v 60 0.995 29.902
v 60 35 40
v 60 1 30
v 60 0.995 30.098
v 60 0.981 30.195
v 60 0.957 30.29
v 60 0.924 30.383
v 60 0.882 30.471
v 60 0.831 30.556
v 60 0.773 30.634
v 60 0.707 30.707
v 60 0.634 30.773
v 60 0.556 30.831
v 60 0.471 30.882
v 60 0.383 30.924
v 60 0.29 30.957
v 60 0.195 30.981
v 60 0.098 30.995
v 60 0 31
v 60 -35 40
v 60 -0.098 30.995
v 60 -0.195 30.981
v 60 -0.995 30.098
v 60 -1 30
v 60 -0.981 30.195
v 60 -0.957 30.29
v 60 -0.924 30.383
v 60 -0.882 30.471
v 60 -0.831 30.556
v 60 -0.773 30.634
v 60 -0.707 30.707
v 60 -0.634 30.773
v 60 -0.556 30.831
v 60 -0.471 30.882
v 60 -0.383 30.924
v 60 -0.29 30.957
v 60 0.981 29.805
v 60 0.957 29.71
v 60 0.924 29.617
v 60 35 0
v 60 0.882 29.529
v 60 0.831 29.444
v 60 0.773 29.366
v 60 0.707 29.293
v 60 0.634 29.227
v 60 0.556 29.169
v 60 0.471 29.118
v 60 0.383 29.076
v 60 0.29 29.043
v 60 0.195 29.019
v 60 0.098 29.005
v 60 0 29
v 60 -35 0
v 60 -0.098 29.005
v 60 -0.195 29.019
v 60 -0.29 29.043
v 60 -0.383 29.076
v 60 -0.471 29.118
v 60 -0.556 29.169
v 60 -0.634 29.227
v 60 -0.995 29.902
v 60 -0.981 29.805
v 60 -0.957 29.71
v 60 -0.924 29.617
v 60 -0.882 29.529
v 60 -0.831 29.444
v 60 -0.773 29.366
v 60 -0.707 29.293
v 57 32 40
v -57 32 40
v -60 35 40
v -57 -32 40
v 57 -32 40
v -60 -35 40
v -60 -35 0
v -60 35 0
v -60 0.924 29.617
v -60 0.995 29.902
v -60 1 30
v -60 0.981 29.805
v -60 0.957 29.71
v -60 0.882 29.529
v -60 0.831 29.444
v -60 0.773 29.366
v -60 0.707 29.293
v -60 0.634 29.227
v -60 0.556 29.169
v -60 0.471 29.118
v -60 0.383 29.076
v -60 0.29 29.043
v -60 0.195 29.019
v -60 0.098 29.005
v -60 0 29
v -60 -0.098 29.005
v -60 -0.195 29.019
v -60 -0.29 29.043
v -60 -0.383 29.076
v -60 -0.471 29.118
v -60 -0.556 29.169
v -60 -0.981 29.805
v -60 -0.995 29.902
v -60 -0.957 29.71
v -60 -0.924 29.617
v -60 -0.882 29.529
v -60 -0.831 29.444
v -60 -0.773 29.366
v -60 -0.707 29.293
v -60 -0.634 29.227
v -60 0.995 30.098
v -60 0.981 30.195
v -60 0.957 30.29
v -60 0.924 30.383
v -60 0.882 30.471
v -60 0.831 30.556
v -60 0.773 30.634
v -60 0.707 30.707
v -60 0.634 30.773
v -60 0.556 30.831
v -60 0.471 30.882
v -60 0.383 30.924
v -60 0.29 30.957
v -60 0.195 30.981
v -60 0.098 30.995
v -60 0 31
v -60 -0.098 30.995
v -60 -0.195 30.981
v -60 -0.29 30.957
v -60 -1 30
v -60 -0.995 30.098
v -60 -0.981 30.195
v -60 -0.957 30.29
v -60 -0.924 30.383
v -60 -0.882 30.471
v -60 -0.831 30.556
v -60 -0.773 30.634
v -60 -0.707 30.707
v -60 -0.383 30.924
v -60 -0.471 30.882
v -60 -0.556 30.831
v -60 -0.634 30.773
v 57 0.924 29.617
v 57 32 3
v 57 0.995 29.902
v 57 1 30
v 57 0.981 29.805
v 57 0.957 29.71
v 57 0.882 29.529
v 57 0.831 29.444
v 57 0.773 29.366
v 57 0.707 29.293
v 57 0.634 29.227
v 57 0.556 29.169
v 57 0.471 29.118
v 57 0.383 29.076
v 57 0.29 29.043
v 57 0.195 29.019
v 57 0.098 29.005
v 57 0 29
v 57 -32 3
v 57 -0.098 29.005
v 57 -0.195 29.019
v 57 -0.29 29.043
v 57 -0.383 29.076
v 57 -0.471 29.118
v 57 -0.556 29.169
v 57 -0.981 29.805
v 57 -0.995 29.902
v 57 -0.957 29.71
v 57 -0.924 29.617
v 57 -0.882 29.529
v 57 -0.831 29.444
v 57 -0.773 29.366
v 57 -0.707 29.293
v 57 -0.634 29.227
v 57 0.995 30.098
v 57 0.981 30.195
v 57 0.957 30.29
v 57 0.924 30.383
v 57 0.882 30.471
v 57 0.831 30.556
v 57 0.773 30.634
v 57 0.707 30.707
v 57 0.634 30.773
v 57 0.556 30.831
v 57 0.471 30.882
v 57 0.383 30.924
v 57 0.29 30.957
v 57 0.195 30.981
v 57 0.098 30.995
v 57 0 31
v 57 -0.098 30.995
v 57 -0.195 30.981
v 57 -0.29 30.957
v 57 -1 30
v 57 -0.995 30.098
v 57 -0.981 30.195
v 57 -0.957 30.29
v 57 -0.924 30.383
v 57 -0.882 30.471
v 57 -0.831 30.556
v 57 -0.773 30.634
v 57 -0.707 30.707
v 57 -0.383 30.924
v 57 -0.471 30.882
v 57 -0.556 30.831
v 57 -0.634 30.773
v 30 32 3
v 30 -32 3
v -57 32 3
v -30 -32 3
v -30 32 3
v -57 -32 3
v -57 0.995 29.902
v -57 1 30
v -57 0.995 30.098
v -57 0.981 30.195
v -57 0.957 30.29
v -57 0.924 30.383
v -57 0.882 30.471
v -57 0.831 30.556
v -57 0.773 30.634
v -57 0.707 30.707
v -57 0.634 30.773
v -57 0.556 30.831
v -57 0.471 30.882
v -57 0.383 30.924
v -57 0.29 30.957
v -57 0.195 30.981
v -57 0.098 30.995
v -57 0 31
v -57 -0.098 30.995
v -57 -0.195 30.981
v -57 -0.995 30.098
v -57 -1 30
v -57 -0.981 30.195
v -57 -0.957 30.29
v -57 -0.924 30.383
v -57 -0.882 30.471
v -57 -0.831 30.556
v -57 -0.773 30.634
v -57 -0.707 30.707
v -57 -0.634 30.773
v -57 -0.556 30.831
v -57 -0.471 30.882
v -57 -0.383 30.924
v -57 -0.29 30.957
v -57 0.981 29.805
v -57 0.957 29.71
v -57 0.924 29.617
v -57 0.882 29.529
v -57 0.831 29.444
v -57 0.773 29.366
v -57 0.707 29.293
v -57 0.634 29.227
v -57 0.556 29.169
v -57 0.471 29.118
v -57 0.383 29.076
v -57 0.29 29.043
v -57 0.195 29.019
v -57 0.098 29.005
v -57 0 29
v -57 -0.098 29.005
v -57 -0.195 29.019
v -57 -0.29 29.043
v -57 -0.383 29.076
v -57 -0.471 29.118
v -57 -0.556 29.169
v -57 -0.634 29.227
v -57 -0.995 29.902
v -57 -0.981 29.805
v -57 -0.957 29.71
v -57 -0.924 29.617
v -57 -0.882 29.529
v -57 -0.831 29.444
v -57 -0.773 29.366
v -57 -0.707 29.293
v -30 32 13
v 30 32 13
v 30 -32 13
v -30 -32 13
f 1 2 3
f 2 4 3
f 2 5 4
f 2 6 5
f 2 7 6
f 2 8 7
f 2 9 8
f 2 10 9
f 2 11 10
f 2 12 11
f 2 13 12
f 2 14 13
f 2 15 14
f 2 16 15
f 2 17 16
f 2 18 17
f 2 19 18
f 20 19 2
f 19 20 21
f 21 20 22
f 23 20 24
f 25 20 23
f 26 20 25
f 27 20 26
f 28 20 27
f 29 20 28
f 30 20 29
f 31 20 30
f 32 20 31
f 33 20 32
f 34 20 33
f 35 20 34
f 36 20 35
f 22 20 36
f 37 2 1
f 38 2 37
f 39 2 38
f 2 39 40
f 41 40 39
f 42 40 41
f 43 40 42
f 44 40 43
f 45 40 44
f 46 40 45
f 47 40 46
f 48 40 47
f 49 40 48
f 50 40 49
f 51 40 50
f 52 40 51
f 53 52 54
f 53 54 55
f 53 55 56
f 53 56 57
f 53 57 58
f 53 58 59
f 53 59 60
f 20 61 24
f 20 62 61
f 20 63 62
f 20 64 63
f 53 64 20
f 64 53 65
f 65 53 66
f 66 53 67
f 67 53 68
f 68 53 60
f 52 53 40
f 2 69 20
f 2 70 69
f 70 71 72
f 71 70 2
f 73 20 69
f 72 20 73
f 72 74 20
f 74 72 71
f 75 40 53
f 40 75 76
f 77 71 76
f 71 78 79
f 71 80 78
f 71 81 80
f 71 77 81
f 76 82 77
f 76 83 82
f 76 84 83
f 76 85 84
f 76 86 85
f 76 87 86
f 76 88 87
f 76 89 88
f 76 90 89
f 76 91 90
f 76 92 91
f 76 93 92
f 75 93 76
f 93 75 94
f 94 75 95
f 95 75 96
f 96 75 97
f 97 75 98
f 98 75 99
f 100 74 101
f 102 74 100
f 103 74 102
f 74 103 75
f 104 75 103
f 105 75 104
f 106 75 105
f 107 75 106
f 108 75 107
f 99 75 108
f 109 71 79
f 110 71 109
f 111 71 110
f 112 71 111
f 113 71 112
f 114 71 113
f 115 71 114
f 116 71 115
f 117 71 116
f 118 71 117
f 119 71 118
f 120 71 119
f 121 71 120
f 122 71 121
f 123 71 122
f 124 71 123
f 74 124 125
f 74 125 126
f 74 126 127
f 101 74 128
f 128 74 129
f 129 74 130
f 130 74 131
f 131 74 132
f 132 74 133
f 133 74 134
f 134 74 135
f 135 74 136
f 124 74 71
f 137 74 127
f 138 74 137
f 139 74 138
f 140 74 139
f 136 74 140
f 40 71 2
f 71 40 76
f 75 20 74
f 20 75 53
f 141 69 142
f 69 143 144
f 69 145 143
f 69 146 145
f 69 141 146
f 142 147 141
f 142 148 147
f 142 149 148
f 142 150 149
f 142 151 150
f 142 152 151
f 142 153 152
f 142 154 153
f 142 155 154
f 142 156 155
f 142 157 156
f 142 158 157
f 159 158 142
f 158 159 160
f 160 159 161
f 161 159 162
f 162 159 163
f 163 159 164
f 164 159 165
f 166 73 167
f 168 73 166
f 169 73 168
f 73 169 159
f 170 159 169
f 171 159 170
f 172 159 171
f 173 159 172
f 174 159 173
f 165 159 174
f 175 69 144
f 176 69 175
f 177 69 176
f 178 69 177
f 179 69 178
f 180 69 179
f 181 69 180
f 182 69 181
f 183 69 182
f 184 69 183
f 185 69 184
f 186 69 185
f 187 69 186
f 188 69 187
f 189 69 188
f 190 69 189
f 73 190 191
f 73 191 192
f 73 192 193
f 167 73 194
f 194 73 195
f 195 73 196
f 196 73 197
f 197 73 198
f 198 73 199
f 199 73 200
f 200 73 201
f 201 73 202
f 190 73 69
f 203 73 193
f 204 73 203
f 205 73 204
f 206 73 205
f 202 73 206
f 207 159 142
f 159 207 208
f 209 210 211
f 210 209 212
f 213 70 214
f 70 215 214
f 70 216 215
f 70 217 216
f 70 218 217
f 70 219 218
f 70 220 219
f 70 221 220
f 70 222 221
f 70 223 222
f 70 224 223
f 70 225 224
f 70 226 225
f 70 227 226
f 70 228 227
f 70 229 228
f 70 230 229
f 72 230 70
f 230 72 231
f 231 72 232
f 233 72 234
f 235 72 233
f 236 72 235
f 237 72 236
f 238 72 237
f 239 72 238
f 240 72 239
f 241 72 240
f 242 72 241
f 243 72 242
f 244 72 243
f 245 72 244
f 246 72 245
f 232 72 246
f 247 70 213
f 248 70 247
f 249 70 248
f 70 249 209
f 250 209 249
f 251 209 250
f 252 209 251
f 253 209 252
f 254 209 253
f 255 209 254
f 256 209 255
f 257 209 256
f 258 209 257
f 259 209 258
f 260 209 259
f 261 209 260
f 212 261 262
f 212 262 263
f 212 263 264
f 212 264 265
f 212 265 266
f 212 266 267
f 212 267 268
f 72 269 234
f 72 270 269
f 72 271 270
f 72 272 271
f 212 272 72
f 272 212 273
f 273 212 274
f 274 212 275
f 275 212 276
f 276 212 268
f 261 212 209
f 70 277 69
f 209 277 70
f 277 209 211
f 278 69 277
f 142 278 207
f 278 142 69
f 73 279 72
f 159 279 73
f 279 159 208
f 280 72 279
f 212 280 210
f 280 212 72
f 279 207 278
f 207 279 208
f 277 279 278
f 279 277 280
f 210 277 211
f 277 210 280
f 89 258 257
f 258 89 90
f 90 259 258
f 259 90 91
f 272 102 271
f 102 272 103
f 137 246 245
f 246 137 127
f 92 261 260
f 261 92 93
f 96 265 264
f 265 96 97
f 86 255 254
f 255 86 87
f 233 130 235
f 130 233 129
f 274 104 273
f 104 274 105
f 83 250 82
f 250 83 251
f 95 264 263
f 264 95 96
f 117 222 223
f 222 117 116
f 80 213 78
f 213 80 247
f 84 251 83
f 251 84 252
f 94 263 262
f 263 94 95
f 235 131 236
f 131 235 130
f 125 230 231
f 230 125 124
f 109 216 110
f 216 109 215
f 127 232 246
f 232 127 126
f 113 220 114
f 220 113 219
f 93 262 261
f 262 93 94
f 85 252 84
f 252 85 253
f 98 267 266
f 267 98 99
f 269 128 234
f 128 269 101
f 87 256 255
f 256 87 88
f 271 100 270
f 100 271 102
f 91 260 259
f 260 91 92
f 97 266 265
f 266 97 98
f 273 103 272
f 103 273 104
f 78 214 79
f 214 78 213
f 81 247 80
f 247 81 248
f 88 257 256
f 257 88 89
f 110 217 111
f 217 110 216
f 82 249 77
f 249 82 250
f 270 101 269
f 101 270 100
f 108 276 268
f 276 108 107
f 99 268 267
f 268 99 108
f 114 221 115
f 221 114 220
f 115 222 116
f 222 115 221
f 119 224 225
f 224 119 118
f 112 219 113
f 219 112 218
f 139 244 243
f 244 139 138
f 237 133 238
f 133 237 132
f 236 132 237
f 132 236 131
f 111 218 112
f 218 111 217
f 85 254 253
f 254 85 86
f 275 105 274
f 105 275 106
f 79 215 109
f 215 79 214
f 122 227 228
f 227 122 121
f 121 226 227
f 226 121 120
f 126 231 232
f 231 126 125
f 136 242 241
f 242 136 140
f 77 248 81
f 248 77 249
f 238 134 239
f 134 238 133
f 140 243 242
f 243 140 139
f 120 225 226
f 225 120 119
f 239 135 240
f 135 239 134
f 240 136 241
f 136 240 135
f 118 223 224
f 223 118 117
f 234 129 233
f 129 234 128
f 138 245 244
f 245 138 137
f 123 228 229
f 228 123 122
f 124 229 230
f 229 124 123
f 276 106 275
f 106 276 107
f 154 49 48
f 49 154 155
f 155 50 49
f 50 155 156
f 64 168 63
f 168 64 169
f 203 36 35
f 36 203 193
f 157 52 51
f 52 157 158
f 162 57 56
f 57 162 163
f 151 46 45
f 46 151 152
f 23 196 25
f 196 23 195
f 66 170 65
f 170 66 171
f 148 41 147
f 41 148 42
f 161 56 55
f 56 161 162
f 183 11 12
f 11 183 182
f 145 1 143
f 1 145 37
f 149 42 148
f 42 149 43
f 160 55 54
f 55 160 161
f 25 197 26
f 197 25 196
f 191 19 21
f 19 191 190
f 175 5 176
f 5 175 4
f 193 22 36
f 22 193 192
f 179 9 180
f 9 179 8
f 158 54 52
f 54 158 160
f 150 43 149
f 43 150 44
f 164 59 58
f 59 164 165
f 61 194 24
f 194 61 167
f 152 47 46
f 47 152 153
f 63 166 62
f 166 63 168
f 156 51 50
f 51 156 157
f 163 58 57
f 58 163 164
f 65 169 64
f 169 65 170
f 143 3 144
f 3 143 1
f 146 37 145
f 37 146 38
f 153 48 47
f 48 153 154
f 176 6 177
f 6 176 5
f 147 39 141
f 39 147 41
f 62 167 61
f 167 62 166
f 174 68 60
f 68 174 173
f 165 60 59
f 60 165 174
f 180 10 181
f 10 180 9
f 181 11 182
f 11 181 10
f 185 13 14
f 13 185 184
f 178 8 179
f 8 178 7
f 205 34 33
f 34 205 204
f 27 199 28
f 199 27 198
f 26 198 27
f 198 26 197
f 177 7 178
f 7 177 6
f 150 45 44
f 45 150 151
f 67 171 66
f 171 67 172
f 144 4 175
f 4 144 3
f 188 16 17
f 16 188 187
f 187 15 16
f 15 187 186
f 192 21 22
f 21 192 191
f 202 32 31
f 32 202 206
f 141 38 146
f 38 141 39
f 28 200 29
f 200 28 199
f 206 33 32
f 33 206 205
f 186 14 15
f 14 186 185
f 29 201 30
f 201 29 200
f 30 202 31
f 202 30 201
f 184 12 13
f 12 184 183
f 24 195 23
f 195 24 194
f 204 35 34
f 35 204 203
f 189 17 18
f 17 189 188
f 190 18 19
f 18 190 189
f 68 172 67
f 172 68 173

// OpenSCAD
// Buffer tank for mini horizontal gel-electrophoresis box
$fn = 64;

tank_x = 120;        // outer length (X)
tank_y = 70;         // outer width (Y)
tank_z = 40;         // outer height (Z)
wall = 3;            // wall thickness
floor_t = 3;         // floor thickness
plat_len = 60;       // platform length in X (centred)
plat_h = 10;         // platform height above inner floor
hole_d = 2;          // electrode wire hole diameter
hole_y = 0;          // hole Y position
hole_z = 30;         // hole Z position
eps = 0.5;           // cutter overshoot

difference() {
    union() {
        // open-top tank shell
        difference() {
            translate([-tank_x/2, -tank_y/2, 0])
                cube([tank_x, tank_y, tank_z]);
            translate([-tank_x/2 + wall, -tank_y/2 + wall, floor_t])
                cube([tank_x - 2*wall, tank_y - 2*wall, tank_z]);
        }
        // raised platform, full inner width, overlapping floor and walls slightly
        translate([-plat_len/2, -tank_y/2 + wall - 0.01, floor_t - 0.01])
            cube([plat_len, tank_y - 2*wall + 0.02, plat_h + 0.01]);
    }
    // electrode wire holes through both end walls, along X
    for (s = [-1, 1])
        translate([s * (tank_x/2 - wall/2), hole_y, hole_z])
            rotate([0, 90, 0])
                cylinder(d = hole_d, h = wall + 2*eps, center = true);
}
